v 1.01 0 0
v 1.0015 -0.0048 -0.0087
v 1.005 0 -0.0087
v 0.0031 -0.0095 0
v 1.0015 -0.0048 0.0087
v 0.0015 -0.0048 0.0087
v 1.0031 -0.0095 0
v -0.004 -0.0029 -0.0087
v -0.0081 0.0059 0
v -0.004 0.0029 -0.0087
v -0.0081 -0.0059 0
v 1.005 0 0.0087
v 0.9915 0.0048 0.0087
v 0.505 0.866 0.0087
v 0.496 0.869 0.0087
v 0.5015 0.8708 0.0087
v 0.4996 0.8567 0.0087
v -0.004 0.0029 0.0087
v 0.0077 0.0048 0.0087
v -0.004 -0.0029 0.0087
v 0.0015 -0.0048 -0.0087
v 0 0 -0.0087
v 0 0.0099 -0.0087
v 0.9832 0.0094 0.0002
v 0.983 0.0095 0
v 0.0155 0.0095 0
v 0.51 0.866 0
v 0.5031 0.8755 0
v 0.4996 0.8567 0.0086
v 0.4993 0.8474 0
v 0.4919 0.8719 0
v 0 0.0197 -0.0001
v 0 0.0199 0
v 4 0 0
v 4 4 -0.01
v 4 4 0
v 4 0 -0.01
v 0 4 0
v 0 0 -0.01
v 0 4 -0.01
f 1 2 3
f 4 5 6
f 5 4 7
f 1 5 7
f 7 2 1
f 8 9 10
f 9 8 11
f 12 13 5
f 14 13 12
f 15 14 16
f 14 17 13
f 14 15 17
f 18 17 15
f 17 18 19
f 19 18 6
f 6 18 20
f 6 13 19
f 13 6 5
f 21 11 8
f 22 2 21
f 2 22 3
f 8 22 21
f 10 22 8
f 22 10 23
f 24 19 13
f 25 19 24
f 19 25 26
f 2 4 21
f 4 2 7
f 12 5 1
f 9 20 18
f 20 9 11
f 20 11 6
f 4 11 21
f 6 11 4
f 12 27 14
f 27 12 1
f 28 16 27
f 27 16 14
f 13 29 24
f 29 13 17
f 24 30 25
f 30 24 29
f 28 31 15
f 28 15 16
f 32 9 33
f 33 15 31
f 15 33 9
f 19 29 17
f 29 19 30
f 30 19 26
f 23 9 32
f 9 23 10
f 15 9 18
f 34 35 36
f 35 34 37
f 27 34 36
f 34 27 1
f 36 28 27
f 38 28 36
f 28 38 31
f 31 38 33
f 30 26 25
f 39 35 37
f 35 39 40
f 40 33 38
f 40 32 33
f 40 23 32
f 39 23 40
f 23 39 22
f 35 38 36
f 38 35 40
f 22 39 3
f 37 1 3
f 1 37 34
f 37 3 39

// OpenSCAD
hull(){
    translate([0.0, 0.0]) sphere(0.01);
    translate([1.0, 0.0]) sphere(0.01);
}
hull(){
    translate([1.0, 0.0]) sphere(0.01);
    translate([0.5, 0.8660254038]) sphere(0.01);
}
hull(){
    translate([0.5, 0.8660254038]) sphere(0.01);
    translate([0.0, 0.0]) sphere(0.01);
}
hull(){
    translate([0.0, 0.0]) sphere(0.01);
    translate([0.0, 0.0]) sphere(0.01);
}
hull(){
    translate([0.0, 0.0]) sphere(0.01);
    translate([0.0, 0.0]) sphere(0.01);
}
translate([0,0,-0.01]) color([0.1,0.1,0.1]) cube([4,4,0.01]);
